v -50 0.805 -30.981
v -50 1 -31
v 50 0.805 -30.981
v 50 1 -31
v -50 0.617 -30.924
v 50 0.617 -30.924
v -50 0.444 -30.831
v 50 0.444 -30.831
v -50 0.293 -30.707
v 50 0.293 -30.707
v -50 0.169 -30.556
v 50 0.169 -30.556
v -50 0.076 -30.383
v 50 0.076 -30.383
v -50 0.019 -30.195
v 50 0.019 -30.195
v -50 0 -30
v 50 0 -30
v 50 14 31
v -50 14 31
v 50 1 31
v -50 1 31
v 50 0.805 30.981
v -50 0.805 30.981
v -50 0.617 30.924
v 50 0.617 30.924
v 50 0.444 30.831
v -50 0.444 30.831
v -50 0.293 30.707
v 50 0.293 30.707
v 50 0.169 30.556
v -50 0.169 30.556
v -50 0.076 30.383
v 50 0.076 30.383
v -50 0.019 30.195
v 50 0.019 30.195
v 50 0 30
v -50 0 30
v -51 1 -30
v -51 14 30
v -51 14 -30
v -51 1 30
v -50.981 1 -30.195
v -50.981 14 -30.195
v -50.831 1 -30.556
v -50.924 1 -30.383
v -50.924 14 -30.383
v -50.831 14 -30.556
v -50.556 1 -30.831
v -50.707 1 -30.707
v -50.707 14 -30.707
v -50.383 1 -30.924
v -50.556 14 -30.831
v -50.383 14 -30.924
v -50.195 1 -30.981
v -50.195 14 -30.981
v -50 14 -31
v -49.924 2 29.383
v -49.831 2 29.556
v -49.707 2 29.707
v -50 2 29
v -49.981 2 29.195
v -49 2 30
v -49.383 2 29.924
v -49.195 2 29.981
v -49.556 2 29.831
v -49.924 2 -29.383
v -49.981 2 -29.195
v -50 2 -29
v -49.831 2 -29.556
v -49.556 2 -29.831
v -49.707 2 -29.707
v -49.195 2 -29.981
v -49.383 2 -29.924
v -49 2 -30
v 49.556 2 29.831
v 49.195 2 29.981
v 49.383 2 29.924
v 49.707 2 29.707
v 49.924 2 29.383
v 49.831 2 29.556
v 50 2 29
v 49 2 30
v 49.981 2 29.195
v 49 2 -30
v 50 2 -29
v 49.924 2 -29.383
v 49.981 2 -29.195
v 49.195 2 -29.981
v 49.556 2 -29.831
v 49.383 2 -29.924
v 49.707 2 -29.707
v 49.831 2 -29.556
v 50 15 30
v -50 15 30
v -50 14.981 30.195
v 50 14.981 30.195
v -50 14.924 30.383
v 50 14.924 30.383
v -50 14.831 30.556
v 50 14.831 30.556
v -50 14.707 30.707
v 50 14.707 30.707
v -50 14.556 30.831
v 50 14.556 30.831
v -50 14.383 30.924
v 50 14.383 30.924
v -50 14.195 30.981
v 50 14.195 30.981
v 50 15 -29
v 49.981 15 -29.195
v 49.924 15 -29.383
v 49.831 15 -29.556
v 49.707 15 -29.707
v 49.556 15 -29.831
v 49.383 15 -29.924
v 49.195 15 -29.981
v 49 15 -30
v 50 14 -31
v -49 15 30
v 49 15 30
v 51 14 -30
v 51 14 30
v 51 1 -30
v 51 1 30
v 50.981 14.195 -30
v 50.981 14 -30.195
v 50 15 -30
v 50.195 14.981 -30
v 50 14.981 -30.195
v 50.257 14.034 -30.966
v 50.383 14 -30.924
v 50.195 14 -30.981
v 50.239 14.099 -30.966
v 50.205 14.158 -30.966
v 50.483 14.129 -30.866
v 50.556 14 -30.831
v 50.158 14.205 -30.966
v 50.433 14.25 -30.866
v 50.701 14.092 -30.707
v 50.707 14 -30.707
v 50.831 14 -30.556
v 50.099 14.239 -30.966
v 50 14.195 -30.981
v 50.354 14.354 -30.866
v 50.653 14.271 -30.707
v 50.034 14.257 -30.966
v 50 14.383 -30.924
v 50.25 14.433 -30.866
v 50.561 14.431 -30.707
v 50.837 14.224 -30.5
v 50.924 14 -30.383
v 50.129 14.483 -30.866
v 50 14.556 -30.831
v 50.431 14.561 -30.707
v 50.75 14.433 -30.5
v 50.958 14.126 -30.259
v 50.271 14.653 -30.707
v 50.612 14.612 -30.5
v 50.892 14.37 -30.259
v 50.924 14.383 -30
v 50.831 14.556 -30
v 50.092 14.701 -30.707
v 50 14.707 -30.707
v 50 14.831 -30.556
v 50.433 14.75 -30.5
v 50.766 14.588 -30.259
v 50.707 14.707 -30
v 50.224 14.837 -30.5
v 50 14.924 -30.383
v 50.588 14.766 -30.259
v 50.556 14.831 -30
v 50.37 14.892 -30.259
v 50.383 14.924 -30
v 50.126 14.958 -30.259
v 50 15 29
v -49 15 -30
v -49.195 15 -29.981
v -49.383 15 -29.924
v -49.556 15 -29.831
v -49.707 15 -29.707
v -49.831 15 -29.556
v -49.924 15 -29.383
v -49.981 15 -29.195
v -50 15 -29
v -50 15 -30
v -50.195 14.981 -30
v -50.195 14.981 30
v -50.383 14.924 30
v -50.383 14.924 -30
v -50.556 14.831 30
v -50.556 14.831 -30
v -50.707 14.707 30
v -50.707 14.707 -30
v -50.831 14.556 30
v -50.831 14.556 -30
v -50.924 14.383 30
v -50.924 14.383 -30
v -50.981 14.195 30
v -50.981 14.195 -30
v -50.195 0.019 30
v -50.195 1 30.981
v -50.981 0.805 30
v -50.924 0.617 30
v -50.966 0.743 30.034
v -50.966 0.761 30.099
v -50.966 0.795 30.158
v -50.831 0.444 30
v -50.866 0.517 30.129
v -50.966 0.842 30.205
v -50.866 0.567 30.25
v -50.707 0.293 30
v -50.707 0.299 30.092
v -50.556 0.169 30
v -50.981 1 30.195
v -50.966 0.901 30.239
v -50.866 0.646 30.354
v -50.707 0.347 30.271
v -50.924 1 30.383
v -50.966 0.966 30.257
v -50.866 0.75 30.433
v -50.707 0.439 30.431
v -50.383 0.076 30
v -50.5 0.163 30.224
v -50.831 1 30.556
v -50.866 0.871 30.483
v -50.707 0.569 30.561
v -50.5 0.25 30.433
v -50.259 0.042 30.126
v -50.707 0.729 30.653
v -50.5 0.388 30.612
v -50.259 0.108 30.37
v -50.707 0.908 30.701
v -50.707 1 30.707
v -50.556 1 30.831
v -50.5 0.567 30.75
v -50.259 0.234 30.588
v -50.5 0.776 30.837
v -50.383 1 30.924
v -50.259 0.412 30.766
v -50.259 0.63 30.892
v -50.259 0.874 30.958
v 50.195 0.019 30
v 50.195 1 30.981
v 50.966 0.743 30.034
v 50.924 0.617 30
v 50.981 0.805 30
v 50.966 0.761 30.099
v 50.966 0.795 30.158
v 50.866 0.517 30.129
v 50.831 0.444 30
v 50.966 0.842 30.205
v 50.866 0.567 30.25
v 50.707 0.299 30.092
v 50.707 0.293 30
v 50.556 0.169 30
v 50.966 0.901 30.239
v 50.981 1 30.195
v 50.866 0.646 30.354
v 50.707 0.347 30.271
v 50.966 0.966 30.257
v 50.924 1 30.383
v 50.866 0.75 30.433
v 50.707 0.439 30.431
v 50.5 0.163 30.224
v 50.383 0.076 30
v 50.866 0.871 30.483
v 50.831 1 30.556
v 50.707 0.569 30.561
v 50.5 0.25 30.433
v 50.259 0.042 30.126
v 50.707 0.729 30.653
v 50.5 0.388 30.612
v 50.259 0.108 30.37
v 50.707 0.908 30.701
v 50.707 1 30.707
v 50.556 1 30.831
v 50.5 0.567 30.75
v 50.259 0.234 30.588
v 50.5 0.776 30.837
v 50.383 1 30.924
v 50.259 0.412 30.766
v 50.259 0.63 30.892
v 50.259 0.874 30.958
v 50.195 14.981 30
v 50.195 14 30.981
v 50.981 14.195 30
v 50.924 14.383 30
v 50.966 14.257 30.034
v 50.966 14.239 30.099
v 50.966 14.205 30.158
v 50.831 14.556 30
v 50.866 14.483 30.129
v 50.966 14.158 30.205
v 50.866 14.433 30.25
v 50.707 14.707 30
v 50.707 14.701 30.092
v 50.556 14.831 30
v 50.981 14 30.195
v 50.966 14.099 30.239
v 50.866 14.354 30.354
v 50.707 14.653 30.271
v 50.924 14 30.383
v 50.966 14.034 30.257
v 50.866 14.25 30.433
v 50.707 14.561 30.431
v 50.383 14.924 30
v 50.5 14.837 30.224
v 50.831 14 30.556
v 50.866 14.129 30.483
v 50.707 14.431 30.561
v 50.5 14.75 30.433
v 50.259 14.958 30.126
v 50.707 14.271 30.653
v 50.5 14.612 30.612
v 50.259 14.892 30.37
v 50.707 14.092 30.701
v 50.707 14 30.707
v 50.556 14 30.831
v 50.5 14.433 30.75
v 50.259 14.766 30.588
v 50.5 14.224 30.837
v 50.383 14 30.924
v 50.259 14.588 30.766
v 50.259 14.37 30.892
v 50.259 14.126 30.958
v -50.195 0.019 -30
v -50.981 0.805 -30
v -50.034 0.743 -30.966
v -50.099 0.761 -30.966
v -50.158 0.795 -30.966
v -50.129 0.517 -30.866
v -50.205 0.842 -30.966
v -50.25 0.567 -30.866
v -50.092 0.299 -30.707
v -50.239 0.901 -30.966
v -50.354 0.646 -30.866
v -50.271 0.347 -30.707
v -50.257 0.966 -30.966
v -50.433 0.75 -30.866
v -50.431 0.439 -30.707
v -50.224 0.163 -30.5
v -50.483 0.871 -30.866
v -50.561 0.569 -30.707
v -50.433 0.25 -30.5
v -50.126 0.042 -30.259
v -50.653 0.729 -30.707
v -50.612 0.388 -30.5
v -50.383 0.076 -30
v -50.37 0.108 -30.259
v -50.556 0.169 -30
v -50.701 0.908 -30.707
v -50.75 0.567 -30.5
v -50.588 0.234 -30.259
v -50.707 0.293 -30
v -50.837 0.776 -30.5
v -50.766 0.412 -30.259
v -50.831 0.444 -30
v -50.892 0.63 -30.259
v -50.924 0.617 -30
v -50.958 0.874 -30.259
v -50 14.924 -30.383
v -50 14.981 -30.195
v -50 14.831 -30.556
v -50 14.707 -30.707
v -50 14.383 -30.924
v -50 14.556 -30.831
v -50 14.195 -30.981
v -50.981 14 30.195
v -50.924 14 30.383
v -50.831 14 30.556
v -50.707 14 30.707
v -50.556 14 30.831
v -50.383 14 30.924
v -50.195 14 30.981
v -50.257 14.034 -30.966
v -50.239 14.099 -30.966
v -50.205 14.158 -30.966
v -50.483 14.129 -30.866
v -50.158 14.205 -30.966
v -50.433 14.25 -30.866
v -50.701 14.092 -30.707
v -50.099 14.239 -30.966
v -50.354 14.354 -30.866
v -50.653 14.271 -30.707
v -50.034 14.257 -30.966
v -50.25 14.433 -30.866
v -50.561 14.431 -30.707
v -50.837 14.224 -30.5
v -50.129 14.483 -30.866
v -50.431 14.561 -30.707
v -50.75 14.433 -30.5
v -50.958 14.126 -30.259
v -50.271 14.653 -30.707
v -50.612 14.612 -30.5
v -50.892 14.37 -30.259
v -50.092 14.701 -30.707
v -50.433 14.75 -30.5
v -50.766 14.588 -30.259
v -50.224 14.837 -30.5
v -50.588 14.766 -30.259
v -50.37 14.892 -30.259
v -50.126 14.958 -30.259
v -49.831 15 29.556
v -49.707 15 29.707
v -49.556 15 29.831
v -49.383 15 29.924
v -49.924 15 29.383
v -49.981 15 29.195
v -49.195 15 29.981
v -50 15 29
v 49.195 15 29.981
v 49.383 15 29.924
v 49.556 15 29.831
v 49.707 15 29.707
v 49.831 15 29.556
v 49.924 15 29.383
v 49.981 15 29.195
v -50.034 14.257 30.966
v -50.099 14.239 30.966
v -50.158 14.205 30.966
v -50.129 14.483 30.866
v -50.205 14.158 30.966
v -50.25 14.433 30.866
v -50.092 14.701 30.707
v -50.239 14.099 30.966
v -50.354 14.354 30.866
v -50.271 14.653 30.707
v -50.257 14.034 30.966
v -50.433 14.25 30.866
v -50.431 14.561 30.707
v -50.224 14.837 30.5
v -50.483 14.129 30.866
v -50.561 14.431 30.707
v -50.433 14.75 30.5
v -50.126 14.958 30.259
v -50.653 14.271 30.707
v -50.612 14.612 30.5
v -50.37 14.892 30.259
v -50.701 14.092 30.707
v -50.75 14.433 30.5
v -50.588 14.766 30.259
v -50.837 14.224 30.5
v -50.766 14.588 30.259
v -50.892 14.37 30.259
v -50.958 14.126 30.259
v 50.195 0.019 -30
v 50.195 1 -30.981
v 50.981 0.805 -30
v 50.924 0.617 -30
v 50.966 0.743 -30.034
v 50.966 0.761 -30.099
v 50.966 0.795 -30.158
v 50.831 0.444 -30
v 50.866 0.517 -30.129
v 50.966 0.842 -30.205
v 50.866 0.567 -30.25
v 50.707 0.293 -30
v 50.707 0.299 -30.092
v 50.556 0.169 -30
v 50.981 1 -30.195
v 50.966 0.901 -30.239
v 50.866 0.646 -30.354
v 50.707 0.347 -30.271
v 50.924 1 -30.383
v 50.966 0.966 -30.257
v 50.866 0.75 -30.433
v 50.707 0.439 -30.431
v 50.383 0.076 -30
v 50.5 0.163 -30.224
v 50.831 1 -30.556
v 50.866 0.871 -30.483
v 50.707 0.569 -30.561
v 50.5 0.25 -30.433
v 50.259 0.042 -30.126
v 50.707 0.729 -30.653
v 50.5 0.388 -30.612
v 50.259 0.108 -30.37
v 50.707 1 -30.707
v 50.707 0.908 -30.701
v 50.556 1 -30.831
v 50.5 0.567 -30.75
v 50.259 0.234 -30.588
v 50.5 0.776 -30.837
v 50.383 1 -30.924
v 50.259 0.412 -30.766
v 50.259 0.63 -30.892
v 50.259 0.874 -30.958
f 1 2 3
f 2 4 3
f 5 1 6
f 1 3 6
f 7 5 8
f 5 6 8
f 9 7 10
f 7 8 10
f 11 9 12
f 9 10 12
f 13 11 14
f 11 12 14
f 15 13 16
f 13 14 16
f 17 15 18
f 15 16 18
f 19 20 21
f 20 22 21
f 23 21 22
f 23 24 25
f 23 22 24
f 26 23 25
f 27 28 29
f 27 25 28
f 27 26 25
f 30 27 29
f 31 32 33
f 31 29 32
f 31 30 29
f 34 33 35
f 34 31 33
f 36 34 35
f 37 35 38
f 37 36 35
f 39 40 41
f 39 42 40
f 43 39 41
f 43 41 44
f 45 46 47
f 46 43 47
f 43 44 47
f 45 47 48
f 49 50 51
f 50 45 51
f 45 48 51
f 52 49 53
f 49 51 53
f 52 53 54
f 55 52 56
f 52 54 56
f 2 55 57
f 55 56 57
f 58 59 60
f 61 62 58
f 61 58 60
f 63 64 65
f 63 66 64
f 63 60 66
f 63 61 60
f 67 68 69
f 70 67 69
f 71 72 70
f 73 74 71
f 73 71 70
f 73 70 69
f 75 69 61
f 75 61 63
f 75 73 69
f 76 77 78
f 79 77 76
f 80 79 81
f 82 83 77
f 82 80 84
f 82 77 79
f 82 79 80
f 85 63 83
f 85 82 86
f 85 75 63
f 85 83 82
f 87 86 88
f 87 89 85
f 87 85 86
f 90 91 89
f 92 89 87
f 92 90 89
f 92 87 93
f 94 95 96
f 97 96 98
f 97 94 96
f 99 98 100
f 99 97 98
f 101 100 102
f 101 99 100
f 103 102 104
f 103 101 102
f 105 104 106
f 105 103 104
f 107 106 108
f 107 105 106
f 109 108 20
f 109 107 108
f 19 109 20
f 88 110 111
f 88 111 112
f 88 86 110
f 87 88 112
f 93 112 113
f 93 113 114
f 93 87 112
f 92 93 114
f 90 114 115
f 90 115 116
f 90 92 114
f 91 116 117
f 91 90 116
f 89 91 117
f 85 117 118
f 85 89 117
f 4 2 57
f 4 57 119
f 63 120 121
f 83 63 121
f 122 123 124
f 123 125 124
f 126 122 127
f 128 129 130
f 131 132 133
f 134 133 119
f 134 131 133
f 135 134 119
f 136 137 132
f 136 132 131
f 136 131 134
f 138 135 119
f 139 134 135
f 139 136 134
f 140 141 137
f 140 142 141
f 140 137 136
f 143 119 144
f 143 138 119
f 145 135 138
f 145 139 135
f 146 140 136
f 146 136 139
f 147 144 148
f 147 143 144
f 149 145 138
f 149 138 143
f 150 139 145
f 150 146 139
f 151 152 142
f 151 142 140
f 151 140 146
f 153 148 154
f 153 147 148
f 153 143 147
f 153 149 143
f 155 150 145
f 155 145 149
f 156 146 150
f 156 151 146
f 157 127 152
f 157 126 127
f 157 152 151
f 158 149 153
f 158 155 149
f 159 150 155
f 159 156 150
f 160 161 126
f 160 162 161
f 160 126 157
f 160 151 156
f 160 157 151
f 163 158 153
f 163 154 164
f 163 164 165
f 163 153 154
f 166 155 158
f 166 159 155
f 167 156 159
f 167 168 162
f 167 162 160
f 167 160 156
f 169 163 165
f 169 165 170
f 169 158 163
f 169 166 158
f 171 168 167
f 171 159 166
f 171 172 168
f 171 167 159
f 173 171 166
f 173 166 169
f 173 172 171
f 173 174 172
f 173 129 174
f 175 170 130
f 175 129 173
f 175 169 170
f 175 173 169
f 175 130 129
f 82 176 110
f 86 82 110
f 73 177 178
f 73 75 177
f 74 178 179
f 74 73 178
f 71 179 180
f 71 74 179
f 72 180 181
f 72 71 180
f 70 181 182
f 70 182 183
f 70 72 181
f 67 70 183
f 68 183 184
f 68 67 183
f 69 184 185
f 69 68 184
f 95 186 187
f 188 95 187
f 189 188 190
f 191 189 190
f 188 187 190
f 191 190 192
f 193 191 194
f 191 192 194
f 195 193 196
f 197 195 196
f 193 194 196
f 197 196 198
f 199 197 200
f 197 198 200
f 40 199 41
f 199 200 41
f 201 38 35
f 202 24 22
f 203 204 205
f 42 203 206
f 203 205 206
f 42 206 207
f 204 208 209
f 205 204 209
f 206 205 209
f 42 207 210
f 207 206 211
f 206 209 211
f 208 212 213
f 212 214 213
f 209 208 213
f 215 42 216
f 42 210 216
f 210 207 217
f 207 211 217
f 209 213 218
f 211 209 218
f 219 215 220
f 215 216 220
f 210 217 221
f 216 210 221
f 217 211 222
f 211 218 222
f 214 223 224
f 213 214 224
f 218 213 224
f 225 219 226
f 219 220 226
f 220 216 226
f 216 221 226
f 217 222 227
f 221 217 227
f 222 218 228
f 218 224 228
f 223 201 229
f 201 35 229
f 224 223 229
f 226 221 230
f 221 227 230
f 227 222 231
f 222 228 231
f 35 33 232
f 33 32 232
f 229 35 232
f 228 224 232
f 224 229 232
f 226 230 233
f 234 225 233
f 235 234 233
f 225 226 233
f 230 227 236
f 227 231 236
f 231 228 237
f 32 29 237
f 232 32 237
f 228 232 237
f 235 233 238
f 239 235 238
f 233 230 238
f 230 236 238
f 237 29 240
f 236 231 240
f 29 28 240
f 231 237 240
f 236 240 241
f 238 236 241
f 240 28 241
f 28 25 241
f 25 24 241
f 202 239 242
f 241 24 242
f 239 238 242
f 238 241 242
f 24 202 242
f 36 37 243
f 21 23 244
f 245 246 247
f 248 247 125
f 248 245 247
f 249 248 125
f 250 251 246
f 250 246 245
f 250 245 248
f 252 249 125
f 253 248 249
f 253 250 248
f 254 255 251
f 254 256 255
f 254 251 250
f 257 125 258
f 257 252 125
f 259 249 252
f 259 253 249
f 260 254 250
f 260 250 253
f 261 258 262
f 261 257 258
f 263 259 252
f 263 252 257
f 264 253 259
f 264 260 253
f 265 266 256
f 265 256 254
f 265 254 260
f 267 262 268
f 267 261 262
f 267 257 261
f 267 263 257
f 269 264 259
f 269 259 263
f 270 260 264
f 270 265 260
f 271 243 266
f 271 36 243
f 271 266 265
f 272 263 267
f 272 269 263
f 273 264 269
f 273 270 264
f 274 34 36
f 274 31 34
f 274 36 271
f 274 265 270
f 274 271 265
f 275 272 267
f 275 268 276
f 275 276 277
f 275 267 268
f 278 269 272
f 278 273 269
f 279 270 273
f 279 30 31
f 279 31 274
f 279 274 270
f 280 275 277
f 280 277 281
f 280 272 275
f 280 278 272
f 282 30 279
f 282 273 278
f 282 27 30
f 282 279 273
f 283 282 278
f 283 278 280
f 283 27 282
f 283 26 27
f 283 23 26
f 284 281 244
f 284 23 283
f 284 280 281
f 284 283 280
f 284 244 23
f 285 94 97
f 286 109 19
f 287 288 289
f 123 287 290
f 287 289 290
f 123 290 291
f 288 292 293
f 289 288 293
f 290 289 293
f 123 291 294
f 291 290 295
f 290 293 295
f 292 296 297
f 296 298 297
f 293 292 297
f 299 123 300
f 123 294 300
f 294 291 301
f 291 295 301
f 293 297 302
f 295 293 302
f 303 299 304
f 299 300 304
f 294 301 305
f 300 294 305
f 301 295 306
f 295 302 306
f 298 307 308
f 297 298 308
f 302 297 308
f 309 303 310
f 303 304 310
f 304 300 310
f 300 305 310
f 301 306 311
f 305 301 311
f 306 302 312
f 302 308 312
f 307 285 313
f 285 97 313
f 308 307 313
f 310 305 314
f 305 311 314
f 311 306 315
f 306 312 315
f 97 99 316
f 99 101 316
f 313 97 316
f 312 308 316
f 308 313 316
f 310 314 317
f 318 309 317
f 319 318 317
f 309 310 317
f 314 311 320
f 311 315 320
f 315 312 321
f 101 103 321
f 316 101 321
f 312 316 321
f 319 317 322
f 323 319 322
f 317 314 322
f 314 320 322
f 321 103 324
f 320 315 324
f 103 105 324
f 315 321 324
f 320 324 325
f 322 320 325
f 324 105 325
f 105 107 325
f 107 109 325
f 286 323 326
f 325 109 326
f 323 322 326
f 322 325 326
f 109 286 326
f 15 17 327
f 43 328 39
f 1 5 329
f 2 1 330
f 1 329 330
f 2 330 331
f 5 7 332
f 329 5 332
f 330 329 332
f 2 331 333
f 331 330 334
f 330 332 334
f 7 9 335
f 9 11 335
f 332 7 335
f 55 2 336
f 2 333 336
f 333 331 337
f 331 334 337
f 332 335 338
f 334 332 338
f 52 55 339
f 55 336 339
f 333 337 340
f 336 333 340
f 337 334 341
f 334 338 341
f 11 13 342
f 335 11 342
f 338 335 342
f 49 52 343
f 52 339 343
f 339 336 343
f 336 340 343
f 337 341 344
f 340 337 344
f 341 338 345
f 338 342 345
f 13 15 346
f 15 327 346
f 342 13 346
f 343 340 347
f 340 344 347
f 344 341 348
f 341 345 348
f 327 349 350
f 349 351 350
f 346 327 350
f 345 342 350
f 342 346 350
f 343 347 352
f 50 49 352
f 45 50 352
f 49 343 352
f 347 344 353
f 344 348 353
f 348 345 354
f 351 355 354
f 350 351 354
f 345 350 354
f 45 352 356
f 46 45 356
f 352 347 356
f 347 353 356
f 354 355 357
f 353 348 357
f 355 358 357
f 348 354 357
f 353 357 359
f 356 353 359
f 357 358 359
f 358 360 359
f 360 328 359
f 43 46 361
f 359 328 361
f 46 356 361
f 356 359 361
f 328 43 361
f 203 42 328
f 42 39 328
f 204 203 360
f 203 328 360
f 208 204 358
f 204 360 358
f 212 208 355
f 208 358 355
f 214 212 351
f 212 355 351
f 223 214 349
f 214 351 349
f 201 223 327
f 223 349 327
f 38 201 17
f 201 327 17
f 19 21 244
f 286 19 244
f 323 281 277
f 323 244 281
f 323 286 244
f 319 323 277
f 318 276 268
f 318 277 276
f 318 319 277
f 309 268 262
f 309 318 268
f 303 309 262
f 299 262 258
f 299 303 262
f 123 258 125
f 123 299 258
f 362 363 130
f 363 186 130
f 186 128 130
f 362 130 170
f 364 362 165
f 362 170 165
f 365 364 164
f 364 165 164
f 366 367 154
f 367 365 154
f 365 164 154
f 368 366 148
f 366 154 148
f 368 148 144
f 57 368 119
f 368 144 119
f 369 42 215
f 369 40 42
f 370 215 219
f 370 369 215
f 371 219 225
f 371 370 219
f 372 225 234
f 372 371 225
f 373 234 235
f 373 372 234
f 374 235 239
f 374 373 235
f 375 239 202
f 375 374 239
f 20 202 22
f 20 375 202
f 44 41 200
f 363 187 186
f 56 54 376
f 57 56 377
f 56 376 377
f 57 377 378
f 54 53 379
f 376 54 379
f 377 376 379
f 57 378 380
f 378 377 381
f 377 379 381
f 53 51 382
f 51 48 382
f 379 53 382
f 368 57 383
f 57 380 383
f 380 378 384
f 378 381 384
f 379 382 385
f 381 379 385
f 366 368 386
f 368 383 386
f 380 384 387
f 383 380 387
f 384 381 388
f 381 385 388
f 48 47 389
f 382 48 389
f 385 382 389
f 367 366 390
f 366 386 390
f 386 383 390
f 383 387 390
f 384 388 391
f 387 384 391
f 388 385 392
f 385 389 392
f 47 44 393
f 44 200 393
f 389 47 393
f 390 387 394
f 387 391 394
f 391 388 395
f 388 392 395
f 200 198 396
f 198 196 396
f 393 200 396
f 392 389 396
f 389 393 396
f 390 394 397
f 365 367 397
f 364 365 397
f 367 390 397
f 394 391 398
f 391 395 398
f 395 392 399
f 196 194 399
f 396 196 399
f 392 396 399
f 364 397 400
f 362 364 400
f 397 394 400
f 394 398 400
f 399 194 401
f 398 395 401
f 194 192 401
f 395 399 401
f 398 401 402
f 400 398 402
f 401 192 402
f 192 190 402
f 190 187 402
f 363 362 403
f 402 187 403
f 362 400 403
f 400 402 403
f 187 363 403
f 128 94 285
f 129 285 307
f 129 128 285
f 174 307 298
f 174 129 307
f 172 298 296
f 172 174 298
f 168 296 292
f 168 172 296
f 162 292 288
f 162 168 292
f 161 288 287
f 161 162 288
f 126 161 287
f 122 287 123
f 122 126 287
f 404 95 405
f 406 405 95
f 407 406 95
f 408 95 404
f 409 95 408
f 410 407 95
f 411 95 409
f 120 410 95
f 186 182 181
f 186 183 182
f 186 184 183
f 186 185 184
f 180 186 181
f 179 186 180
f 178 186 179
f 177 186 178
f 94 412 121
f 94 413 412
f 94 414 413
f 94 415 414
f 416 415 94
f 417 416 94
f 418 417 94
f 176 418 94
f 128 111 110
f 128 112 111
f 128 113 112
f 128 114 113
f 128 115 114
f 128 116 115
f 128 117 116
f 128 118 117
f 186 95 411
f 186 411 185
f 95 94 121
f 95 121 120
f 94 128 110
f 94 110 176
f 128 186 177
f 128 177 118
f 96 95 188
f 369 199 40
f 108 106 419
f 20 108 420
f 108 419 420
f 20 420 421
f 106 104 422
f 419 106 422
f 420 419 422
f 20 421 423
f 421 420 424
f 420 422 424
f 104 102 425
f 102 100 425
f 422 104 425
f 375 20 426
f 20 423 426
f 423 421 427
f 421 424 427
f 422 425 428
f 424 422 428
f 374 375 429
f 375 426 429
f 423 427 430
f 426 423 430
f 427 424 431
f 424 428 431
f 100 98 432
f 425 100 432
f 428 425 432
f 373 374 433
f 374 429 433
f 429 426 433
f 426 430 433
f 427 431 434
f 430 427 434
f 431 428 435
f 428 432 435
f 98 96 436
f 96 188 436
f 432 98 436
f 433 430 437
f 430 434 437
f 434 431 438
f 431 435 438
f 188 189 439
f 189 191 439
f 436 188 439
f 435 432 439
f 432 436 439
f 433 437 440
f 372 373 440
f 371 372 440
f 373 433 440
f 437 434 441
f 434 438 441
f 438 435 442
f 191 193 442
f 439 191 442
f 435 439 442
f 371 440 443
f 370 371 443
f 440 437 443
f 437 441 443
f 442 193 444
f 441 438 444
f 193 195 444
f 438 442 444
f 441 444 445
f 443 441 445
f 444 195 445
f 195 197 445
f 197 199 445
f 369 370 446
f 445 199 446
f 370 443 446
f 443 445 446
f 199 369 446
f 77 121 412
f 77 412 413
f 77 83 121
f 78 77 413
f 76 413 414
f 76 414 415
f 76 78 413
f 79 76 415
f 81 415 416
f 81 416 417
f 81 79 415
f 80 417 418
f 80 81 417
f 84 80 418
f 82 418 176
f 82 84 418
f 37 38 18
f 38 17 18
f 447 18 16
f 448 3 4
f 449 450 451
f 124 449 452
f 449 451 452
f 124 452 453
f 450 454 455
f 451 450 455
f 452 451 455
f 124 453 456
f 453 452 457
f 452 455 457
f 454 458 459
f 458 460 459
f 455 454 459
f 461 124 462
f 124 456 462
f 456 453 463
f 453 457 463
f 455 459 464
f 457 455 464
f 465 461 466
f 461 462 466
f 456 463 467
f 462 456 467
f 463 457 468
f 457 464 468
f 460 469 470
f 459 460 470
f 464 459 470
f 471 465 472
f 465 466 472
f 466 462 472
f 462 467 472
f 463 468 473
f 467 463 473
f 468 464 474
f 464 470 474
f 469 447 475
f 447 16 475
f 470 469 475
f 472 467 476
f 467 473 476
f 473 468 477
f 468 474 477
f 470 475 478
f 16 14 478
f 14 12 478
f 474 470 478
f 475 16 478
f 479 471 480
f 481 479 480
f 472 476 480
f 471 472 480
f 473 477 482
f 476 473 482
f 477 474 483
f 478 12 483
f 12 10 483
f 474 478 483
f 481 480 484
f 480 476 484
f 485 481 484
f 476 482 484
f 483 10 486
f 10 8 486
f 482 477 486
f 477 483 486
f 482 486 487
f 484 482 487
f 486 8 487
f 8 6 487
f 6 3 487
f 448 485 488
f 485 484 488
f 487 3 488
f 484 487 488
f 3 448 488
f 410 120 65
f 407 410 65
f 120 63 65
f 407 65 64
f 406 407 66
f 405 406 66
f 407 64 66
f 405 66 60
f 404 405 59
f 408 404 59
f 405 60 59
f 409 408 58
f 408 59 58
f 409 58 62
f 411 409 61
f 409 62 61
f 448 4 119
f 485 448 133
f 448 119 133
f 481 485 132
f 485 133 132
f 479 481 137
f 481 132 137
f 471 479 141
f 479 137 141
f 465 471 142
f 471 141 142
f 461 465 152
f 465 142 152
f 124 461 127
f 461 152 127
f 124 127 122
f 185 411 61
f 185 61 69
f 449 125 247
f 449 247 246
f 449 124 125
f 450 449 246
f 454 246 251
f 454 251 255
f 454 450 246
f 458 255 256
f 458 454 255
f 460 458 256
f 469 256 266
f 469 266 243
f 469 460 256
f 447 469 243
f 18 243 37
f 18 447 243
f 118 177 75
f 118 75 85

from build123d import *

# Parameters (mm, degrees)
SKETCH1_W           = 102
SKETCH1_H           = 62
BOSS_EXTRUDE1_DEPTH = 15
SKETCH2_W           = 100
SKETCH2_H           = 60
CUT_EXTRUDE1_DEPTH  = 13
FILLET2_R           = 1
FILLET3_R           = 1


with BuildPart() as part:
    # Sketch1 → Boss-Extrude1 (new body)
    with BuildSketch(Plane(origin=(0, 0, 0), x_dir=(1, 0, 0), z_dir=(0, 1, 0))):
        Rectangle(SKETCH1_W, SKETCH1_H)
    extrude(amount=BOSS_EXTRUDE1_DEPTH)

    # Sketch2 → Cut-Extrude1 (cut)
    with BuildSketch(Plane(origin=(0, 15, 0), x_dir=(1, 0, 0), z_dir=(0, 1, 0))):
        Rectangle(SKETCH2_W, SKETCH2_H)
    extrude(amount=-CUT_EXTRUDE1_DEPTH, mode=Mode.SUBTRACT)

    # Fillet2
    fillet2_edges = [part.edges().sort_by_distance(p)[0] for p in [
        (50, 8.5, -30),
        (50, 8.5, 30),
        (-50, 8.5, 30),
        (-50, 8.5, -30),
    ]]
    fillet(fillet2_edges, radius=FILLET2_R)

    # Fillet3
    fillet3_edges = [part.edges().sort_by_distance(p)[0] for p in [
        (-51, 15, 0),
        (0, 15, 31),
        (51, 15, 0),
        (0, 0, 31),
        (-51, 0, 0),
        (0, 0, -31),
        (51, 0, 0),
        (51, 7.5, 31),
        (-51, 7.5, 31),
        (-51, 7.5, -31),
        (51, 7.5, -31),
        (0, 15, -31),
    ]]
    fillet(fillet3_edges, radius=FILLET3_R - 0.0001)  # a hair under: the kernel refuses the full size


solid = part.part
